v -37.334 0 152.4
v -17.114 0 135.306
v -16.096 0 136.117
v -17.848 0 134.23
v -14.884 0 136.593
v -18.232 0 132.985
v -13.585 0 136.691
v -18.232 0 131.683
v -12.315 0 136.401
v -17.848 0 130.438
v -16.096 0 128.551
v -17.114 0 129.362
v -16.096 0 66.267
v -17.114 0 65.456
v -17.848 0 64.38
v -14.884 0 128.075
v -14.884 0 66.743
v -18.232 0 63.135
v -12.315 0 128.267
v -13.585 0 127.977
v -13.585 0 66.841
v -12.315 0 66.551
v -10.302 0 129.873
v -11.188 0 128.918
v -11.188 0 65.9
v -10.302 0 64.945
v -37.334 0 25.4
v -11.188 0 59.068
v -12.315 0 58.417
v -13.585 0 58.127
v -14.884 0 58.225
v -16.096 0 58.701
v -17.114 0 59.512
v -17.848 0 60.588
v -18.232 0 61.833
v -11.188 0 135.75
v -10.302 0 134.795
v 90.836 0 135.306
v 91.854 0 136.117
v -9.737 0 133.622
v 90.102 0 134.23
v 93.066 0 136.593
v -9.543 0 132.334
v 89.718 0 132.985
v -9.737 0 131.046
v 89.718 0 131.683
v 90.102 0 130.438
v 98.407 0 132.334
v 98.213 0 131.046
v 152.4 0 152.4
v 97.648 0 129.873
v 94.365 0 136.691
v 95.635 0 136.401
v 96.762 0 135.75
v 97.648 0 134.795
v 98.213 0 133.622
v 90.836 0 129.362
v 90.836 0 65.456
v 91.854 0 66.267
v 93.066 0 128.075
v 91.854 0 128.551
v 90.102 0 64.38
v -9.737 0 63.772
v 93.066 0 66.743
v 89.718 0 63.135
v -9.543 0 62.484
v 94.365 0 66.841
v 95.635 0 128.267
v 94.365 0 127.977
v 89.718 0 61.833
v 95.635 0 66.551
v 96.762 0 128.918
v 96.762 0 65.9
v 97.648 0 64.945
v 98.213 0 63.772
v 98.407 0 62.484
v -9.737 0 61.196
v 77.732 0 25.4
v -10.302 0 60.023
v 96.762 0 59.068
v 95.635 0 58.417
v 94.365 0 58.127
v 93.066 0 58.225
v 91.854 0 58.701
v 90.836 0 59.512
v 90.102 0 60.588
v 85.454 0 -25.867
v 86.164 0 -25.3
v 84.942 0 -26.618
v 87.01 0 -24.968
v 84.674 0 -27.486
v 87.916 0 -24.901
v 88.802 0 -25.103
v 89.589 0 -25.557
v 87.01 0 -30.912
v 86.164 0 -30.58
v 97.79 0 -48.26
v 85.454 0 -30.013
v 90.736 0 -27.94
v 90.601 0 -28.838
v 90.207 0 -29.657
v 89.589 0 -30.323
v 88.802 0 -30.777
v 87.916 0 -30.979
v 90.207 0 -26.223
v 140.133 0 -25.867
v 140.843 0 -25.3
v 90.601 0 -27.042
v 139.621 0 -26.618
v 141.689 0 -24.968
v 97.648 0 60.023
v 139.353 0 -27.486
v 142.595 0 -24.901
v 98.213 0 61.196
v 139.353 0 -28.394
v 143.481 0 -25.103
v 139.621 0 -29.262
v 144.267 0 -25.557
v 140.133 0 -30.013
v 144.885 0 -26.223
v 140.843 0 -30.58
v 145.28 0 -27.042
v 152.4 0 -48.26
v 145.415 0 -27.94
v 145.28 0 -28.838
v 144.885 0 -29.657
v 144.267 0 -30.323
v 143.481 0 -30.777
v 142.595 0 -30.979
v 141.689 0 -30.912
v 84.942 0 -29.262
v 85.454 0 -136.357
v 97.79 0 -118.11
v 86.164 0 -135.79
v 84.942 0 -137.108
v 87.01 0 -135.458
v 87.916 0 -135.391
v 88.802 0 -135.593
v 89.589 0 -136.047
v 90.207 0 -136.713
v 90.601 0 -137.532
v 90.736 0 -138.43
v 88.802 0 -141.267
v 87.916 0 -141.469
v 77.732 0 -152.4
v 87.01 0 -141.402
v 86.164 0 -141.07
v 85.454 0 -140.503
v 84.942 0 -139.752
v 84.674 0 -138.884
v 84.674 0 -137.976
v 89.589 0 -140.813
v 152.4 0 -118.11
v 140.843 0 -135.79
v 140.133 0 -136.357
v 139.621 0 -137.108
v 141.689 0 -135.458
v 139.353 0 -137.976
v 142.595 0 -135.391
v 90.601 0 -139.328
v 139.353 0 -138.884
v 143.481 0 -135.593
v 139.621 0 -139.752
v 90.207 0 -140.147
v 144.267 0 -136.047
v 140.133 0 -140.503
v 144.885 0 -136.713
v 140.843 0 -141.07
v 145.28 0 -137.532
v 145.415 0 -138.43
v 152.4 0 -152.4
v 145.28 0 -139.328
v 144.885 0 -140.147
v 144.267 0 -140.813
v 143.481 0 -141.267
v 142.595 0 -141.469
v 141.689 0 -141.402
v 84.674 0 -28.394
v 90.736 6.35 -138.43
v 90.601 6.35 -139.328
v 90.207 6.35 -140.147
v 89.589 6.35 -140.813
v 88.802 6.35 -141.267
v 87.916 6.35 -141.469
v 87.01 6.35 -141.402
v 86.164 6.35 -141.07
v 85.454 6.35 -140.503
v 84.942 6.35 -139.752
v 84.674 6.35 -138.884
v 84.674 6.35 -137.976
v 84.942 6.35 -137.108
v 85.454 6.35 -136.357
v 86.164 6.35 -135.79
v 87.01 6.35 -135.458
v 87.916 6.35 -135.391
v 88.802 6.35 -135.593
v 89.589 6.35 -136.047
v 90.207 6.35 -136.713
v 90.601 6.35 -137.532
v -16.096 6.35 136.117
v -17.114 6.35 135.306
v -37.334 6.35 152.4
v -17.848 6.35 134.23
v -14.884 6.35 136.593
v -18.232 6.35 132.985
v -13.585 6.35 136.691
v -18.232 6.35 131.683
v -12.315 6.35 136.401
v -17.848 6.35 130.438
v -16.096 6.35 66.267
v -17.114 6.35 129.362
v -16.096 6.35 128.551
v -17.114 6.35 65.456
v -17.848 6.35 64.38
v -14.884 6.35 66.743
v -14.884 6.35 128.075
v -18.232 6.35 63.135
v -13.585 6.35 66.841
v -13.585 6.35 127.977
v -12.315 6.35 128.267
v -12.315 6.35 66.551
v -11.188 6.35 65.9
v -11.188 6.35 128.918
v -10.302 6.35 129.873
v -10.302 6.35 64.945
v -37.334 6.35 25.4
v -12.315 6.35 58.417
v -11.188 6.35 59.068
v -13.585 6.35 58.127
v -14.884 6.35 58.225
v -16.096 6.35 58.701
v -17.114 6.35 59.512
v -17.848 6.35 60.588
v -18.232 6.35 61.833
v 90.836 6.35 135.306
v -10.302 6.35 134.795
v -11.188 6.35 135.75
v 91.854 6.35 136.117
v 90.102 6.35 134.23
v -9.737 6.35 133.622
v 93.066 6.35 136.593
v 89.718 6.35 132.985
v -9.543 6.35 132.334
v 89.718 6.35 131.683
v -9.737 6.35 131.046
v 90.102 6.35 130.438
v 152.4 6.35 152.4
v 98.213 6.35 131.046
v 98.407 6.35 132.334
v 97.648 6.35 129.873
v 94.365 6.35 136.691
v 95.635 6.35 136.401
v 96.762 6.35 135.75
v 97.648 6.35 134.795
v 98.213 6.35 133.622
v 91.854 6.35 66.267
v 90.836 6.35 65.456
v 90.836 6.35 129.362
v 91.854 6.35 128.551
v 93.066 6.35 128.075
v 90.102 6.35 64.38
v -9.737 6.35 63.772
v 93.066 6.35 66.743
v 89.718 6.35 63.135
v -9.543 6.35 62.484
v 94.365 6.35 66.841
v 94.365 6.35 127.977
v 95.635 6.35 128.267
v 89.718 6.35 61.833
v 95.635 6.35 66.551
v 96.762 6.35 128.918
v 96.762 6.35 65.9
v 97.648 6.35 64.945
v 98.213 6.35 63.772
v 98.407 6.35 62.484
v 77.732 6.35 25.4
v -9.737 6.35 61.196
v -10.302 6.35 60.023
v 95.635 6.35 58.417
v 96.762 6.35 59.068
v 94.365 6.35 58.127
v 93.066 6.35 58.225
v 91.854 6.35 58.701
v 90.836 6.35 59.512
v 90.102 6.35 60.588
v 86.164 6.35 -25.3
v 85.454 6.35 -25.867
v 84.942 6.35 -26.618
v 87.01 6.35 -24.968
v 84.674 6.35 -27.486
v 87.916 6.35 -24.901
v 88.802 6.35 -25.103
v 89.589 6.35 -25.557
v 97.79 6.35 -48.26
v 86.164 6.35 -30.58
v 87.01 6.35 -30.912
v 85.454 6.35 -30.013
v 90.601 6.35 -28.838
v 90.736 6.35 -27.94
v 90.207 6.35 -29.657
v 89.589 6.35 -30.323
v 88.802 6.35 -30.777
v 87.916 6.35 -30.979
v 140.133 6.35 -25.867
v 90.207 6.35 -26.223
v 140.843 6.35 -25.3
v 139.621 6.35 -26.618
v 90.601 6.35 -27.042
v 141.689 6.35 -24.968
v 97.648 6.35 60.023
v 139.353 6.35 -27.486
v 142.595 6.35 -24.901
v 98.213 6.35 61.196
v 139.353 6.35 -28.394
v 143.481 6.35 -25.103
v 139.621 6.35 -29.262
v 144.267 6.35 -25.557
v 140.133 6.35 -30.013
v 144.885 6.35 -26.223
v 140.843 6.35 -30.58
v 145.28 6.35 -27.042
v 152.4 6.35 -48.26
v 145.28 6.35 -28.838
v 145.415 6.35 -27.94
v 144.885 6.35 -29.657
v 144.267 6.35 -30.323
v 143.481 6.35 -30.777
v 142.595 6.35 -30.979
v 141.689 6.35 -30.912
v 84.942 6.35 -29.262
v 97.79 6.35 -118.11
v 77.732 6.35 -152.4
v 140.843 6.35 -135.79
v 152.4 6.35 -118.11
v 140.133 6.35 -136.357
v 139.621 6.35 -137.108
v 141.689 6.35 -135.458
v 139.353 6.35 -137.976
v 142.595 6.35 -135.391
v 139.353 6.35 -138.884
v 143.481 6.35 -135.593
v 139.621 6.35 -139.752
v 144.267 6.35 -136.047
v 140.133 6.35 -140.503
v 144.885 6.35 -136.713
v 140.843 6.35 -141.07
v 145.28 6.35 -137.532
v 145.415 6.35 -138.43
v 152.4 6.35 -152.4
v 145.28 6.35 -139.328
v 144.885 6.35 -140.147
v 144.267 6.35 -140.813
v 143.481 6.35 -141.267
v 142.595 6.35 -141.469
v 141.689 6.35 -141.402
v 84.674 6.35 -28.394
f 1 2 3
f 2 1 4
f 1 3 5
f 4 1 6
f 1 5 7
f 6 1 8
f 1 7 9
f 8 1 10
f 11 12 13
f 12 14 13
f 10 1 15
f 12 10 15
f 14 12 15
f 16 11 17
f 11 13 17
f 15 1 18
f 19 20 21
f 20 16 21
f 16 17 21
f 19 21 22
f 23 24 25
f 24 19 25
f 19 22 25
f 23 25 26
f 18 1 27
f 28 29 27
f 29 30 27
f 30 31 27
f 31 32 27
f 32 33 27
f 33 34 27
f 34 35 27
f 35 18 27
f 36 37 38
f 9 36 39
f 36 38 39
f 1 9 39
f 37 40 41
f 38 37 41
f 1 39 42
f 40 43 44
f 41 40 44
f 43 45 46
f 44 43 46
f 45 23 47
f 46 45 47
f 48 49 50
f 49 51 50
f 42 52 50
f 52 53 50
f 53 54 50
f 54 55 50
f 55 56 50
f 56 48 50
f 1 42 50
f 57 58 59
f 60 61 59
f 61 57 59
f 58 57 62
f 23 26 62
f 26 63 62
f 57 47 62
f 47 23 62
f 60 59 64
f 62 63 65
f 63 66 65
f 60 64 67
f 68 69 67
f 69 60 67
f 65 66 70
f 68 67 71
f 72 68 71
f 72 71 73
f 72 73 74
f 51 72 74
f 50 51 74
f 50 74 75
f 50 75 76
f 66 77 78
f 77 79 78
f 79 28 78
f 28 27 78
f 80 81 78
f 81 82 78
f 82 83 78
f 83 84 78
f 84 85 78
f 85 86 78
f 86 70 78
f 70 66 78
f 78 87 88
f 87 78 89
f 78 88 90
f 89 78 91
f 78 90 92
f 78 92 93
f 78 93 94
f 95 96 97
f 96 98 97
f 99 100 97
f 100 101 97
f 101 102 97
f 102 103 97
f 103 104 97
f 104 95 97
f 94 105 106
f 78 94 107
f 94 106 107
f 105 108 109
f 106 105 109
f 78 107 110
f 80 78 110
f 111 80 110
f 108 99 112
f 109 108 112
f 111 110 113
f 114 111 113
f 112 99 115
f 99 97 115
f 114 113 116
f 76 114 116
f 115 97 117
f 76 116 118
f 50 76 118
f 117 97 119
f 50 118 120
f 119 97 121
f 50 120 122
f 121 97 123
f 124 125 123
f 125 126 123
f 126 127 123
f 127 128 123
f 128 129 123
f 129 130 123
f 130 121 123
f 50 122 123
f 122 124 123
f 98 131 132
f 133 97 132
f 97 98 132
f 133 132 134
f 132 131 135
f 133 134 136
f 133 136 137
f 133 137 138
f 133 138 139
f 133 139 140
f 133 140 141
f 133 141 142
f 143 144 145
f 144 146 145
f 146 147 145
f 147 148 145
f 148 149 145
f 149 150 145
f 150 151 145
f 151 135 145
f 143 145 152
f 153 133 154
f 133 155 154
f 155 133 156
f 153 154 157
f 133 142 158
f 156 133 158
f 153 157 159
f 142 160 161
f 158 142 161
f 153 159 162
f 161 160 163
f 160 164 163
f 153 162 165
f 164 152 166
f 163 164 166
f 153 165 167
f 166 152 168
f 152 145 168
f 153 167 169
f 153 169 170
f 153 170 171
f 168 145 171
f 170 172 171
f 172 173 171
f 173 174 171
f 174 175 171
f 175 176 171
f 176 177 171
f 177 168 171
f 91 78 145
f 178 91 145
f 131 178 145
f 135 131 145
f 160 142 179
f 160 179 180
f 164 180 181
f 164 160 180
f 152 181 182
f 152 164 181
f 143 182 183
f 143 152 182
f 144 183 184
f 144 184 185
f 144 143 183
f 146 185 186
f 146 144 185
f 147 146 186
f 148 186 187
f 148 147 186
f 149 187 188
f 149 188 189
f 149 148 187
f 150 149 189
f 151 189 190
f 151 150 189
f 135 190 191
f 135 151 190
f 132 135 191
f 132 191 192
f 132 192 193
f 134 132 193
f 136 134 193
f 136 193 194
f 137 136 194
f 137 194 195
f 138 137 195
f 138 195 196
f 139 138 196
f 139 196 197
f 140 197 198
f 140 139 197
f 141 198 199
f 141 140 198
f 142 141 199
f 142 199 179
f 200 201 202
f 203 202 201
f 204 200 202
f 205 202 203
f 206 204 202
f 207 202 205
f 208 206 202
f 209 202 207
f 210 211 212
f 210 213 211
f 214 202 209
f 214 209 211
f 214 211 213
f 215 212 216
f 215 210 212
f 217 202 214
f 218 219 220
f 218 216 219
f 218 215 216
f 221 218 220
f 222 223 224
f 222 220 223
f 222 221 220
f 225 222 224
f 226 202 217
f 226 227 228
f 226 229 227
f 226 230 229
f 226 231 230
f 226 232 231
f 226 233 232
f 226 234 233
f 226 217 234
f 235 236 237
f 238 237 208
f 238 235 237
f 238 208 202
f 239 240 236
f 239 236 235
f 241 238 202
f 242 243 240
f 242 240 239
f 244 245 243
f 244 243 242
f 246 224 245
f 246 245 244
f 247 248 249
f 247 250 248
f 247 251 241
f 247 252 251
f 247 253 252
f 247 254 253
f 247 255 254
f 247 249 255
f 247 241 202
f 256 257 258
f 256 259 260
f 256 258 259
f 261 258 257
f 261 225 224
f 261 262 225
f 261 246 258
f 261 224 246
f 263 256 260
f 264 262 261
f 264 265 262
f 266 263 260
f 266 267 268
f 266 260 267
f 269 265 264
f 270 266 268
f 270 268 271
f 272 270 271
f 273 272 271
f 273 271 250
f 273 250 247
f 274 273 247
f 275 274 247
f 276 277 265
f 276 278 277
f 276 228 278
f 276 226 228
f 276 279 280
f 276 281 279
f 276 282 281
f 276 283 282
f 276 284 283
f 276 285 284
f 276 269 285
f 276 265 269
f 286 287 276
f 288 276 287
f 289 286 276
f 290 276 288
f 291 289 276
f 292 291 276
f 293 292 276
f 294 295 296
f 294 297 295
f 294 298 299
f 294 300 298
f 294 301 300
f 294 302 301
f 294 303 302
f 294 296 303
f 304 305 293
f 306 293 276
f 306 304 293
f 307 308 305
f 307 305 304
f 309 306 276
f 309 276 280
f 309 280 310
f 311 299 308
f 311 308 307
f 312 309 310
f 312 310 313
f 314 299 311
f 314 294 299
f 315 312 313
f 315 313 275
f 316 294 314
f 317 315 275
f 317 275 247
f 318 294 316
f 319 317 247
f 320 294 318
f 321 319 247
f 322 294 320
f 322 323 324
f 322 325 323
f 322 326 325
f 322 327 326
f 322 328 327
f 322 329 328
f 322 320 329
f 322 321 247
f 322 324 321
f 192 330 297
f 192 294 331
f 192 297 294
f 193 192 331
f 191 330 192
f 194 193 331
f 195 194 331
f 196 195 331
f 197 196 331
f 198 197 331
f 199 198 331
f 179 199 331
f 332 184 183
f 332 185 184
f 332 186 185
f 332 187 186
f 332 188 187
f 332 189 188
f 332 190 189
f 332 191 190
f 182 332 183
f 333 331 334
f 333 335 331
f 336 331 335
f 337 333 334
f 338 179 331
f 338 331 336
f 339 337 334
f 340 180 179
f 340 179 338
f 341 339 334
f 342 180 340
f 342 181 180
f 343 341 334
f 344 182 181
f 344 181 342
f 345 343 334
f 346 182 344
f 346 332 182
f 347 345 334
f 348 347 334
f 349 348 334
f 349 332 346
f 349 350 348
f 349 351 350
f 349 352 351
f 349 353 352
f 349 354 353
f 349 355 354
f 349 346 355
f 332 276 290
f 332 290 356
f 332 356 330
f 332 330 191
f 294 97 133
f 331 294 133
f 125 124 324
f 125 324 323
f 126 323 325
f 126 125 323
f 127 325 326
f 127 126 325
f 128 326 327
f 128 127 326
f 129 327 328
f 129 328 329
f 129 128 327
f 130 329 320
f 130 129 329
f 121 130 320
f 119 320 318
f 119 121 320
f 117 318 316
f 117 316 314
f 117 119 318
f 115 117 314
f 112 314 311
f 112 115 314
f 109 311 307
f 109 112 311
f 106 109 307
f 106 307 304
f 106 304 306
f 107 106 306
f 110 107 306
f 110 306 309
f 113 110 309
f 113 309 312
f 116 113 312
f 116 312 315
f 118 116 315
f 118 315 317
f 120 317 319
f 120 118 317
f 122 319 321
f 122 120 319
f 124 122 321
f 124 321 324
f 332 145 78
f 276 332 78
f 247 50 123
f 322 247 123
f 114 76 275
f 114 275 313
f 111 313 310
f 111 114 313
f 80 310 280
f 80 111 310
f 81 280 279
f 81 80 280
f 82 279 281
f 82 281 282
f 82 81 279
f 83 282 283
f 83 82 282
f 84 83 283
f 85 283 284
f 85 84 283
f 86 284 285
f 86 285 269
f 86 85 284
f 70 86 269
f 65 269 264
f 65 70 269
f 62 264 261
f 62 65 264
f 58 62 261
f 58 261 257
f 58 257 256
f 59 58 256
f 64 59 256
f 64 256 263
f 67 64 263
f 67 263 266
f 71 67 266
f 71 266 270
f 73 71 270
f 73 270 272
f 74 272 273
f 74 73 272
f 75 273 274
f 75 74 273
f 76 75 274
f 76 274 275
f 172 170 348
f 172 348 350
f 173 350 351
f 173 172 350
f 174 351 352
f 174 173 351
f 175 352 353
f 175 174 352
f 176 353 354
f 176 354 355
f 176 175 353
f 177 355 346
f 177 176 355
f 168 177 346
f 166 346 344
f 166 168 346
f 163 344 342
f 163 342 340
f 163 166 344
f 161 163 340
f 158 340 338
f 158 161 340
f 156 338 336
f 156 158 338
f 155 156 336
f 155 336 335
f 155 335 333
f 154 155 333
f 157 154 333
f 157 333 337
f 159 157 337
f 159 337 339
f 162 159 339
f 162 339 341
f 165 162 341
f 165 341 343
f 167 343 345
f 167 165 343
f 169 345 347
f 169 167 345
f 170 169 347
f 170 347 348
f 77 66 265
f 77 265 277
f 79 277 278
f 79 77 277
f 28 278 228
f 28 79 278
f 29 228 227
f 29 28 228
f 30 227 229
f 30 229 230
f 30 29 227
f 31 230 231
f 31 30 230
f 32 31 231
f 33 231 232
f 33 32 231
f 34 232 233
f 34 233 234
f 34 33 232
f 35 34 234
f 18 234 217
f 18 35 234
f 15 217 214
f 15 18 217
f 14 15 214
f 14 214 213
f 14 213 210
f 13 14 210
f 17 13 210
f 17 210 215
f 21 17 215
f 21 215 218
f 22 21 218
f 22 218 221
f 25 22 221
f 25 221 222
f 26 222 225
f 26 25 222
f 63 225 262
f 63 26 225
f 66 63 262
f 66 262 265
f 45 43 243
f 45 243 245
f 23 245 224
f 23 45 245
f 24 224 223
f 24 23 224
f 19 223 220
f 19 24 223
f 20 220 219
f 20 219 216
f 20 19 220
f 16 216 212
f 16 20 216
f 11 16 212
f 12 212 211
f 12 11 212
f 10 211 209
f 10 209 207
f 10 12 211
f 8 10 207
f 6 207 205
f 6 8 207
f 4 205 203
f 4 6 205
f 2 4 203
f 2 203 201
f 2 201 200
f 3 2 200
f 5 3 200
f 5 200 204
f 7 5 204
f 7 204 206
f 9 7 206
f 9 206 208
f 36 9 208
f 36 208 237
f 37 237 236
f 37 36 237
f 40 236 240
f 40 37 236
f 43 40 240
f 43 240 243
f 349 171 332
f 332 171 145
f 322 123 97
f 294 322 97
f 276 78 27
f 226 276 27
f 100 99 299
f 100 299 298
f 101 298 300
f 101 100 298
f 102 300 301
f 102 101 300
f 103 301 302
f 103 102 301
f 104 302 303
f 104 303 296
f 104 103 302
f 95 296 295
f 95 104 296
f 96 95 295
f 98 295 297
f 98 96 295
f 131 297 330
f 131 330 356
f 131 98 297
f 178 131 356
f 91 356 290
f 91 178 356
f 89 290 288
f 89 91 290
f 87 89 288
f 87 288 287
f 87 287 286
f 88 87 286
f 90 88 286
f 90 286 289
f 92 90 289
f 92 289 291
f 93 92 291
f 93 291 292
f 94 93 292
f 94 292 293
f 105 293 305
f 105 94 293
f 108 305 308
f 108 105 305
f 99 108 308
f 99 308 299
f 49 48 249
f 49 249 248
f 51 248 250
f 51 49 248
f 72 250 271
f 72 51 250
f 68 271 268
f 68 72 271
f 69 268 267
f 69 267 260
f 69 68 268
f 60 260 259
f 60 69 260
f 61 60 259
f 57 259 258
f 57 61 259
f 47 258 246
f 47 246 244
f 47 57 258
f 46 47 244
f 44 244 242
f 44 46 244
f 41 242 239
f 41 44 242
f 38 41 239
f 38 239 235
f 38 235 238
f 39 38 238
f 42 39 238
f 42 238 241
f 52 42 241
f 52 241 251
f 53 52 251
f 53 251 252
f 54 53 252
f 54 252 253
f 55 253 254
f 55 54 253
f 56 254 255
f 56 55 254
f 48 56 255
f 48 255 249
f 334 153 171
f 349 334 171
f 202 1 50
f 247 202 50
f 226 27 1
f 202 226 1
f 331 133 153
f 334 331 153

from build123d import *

# Parameters (mm, degrees)
SKETCH1_R           = 4.3688
SKETCH1_R_2         = 3.048
BOSS_EXTRUDE1_DEPTH = 6.35


with BuildPart() as part:
    # Sketch1 → Boss-Extrude1 (new body)
    with BuildSketch(Plane(origin=(0, 0, 0), x_dir=(1, 0, 0), z_dir=(0, 1, 0))):
        Polygon((152.4, 152.4), (77.73162, 152.4), (77.73162, -25.4), (-37.33419, -25.4), (-37.33419, -152.4), (152.4, -152.4), (152.4, 48.26), (97.79, 48.26), (97.79, 118.11), (152.4, 118.11), align=None)
        with Locations((-13.91158, -132.334)):
            Circle(SKETCH1_R, mode=Mode.SUBTRACT)
        with Locations((-13.91158, -62.484)):
            Circle(SKETCH1_R, mode=Mode.SUBTRACT)
        with Locations((94.03842, -132.334)):
            Circle(SKETCH1_R, mode=Mode.SUBTRACT)
        with Locations((94.03842, -62.484)):
            Circle(SKETCH1_R, mode=Mode.SUBTRACT)
        with Locations((87.68842, 27.94)):
            Circle(SKETCH1_R_2, mode=Mode.SUBTRACT)
        with Locations((142.367, 27.94)):
            Circle(SKETCH1_R_2, mode=Mode.SUBTRACT)
        with Locations((87.68842, 138.43)):
            Circle(SKETCH1_R_2, mode=Mode.SUBTRACT)
        with Locations((142.367, 138.43)):
            Circle(SKETCH1_R_2, mode=Mode.SUBTRACT)
    extrude(amount=BOSS_EXTRUDE1_DEPTH)


solid = part.part
